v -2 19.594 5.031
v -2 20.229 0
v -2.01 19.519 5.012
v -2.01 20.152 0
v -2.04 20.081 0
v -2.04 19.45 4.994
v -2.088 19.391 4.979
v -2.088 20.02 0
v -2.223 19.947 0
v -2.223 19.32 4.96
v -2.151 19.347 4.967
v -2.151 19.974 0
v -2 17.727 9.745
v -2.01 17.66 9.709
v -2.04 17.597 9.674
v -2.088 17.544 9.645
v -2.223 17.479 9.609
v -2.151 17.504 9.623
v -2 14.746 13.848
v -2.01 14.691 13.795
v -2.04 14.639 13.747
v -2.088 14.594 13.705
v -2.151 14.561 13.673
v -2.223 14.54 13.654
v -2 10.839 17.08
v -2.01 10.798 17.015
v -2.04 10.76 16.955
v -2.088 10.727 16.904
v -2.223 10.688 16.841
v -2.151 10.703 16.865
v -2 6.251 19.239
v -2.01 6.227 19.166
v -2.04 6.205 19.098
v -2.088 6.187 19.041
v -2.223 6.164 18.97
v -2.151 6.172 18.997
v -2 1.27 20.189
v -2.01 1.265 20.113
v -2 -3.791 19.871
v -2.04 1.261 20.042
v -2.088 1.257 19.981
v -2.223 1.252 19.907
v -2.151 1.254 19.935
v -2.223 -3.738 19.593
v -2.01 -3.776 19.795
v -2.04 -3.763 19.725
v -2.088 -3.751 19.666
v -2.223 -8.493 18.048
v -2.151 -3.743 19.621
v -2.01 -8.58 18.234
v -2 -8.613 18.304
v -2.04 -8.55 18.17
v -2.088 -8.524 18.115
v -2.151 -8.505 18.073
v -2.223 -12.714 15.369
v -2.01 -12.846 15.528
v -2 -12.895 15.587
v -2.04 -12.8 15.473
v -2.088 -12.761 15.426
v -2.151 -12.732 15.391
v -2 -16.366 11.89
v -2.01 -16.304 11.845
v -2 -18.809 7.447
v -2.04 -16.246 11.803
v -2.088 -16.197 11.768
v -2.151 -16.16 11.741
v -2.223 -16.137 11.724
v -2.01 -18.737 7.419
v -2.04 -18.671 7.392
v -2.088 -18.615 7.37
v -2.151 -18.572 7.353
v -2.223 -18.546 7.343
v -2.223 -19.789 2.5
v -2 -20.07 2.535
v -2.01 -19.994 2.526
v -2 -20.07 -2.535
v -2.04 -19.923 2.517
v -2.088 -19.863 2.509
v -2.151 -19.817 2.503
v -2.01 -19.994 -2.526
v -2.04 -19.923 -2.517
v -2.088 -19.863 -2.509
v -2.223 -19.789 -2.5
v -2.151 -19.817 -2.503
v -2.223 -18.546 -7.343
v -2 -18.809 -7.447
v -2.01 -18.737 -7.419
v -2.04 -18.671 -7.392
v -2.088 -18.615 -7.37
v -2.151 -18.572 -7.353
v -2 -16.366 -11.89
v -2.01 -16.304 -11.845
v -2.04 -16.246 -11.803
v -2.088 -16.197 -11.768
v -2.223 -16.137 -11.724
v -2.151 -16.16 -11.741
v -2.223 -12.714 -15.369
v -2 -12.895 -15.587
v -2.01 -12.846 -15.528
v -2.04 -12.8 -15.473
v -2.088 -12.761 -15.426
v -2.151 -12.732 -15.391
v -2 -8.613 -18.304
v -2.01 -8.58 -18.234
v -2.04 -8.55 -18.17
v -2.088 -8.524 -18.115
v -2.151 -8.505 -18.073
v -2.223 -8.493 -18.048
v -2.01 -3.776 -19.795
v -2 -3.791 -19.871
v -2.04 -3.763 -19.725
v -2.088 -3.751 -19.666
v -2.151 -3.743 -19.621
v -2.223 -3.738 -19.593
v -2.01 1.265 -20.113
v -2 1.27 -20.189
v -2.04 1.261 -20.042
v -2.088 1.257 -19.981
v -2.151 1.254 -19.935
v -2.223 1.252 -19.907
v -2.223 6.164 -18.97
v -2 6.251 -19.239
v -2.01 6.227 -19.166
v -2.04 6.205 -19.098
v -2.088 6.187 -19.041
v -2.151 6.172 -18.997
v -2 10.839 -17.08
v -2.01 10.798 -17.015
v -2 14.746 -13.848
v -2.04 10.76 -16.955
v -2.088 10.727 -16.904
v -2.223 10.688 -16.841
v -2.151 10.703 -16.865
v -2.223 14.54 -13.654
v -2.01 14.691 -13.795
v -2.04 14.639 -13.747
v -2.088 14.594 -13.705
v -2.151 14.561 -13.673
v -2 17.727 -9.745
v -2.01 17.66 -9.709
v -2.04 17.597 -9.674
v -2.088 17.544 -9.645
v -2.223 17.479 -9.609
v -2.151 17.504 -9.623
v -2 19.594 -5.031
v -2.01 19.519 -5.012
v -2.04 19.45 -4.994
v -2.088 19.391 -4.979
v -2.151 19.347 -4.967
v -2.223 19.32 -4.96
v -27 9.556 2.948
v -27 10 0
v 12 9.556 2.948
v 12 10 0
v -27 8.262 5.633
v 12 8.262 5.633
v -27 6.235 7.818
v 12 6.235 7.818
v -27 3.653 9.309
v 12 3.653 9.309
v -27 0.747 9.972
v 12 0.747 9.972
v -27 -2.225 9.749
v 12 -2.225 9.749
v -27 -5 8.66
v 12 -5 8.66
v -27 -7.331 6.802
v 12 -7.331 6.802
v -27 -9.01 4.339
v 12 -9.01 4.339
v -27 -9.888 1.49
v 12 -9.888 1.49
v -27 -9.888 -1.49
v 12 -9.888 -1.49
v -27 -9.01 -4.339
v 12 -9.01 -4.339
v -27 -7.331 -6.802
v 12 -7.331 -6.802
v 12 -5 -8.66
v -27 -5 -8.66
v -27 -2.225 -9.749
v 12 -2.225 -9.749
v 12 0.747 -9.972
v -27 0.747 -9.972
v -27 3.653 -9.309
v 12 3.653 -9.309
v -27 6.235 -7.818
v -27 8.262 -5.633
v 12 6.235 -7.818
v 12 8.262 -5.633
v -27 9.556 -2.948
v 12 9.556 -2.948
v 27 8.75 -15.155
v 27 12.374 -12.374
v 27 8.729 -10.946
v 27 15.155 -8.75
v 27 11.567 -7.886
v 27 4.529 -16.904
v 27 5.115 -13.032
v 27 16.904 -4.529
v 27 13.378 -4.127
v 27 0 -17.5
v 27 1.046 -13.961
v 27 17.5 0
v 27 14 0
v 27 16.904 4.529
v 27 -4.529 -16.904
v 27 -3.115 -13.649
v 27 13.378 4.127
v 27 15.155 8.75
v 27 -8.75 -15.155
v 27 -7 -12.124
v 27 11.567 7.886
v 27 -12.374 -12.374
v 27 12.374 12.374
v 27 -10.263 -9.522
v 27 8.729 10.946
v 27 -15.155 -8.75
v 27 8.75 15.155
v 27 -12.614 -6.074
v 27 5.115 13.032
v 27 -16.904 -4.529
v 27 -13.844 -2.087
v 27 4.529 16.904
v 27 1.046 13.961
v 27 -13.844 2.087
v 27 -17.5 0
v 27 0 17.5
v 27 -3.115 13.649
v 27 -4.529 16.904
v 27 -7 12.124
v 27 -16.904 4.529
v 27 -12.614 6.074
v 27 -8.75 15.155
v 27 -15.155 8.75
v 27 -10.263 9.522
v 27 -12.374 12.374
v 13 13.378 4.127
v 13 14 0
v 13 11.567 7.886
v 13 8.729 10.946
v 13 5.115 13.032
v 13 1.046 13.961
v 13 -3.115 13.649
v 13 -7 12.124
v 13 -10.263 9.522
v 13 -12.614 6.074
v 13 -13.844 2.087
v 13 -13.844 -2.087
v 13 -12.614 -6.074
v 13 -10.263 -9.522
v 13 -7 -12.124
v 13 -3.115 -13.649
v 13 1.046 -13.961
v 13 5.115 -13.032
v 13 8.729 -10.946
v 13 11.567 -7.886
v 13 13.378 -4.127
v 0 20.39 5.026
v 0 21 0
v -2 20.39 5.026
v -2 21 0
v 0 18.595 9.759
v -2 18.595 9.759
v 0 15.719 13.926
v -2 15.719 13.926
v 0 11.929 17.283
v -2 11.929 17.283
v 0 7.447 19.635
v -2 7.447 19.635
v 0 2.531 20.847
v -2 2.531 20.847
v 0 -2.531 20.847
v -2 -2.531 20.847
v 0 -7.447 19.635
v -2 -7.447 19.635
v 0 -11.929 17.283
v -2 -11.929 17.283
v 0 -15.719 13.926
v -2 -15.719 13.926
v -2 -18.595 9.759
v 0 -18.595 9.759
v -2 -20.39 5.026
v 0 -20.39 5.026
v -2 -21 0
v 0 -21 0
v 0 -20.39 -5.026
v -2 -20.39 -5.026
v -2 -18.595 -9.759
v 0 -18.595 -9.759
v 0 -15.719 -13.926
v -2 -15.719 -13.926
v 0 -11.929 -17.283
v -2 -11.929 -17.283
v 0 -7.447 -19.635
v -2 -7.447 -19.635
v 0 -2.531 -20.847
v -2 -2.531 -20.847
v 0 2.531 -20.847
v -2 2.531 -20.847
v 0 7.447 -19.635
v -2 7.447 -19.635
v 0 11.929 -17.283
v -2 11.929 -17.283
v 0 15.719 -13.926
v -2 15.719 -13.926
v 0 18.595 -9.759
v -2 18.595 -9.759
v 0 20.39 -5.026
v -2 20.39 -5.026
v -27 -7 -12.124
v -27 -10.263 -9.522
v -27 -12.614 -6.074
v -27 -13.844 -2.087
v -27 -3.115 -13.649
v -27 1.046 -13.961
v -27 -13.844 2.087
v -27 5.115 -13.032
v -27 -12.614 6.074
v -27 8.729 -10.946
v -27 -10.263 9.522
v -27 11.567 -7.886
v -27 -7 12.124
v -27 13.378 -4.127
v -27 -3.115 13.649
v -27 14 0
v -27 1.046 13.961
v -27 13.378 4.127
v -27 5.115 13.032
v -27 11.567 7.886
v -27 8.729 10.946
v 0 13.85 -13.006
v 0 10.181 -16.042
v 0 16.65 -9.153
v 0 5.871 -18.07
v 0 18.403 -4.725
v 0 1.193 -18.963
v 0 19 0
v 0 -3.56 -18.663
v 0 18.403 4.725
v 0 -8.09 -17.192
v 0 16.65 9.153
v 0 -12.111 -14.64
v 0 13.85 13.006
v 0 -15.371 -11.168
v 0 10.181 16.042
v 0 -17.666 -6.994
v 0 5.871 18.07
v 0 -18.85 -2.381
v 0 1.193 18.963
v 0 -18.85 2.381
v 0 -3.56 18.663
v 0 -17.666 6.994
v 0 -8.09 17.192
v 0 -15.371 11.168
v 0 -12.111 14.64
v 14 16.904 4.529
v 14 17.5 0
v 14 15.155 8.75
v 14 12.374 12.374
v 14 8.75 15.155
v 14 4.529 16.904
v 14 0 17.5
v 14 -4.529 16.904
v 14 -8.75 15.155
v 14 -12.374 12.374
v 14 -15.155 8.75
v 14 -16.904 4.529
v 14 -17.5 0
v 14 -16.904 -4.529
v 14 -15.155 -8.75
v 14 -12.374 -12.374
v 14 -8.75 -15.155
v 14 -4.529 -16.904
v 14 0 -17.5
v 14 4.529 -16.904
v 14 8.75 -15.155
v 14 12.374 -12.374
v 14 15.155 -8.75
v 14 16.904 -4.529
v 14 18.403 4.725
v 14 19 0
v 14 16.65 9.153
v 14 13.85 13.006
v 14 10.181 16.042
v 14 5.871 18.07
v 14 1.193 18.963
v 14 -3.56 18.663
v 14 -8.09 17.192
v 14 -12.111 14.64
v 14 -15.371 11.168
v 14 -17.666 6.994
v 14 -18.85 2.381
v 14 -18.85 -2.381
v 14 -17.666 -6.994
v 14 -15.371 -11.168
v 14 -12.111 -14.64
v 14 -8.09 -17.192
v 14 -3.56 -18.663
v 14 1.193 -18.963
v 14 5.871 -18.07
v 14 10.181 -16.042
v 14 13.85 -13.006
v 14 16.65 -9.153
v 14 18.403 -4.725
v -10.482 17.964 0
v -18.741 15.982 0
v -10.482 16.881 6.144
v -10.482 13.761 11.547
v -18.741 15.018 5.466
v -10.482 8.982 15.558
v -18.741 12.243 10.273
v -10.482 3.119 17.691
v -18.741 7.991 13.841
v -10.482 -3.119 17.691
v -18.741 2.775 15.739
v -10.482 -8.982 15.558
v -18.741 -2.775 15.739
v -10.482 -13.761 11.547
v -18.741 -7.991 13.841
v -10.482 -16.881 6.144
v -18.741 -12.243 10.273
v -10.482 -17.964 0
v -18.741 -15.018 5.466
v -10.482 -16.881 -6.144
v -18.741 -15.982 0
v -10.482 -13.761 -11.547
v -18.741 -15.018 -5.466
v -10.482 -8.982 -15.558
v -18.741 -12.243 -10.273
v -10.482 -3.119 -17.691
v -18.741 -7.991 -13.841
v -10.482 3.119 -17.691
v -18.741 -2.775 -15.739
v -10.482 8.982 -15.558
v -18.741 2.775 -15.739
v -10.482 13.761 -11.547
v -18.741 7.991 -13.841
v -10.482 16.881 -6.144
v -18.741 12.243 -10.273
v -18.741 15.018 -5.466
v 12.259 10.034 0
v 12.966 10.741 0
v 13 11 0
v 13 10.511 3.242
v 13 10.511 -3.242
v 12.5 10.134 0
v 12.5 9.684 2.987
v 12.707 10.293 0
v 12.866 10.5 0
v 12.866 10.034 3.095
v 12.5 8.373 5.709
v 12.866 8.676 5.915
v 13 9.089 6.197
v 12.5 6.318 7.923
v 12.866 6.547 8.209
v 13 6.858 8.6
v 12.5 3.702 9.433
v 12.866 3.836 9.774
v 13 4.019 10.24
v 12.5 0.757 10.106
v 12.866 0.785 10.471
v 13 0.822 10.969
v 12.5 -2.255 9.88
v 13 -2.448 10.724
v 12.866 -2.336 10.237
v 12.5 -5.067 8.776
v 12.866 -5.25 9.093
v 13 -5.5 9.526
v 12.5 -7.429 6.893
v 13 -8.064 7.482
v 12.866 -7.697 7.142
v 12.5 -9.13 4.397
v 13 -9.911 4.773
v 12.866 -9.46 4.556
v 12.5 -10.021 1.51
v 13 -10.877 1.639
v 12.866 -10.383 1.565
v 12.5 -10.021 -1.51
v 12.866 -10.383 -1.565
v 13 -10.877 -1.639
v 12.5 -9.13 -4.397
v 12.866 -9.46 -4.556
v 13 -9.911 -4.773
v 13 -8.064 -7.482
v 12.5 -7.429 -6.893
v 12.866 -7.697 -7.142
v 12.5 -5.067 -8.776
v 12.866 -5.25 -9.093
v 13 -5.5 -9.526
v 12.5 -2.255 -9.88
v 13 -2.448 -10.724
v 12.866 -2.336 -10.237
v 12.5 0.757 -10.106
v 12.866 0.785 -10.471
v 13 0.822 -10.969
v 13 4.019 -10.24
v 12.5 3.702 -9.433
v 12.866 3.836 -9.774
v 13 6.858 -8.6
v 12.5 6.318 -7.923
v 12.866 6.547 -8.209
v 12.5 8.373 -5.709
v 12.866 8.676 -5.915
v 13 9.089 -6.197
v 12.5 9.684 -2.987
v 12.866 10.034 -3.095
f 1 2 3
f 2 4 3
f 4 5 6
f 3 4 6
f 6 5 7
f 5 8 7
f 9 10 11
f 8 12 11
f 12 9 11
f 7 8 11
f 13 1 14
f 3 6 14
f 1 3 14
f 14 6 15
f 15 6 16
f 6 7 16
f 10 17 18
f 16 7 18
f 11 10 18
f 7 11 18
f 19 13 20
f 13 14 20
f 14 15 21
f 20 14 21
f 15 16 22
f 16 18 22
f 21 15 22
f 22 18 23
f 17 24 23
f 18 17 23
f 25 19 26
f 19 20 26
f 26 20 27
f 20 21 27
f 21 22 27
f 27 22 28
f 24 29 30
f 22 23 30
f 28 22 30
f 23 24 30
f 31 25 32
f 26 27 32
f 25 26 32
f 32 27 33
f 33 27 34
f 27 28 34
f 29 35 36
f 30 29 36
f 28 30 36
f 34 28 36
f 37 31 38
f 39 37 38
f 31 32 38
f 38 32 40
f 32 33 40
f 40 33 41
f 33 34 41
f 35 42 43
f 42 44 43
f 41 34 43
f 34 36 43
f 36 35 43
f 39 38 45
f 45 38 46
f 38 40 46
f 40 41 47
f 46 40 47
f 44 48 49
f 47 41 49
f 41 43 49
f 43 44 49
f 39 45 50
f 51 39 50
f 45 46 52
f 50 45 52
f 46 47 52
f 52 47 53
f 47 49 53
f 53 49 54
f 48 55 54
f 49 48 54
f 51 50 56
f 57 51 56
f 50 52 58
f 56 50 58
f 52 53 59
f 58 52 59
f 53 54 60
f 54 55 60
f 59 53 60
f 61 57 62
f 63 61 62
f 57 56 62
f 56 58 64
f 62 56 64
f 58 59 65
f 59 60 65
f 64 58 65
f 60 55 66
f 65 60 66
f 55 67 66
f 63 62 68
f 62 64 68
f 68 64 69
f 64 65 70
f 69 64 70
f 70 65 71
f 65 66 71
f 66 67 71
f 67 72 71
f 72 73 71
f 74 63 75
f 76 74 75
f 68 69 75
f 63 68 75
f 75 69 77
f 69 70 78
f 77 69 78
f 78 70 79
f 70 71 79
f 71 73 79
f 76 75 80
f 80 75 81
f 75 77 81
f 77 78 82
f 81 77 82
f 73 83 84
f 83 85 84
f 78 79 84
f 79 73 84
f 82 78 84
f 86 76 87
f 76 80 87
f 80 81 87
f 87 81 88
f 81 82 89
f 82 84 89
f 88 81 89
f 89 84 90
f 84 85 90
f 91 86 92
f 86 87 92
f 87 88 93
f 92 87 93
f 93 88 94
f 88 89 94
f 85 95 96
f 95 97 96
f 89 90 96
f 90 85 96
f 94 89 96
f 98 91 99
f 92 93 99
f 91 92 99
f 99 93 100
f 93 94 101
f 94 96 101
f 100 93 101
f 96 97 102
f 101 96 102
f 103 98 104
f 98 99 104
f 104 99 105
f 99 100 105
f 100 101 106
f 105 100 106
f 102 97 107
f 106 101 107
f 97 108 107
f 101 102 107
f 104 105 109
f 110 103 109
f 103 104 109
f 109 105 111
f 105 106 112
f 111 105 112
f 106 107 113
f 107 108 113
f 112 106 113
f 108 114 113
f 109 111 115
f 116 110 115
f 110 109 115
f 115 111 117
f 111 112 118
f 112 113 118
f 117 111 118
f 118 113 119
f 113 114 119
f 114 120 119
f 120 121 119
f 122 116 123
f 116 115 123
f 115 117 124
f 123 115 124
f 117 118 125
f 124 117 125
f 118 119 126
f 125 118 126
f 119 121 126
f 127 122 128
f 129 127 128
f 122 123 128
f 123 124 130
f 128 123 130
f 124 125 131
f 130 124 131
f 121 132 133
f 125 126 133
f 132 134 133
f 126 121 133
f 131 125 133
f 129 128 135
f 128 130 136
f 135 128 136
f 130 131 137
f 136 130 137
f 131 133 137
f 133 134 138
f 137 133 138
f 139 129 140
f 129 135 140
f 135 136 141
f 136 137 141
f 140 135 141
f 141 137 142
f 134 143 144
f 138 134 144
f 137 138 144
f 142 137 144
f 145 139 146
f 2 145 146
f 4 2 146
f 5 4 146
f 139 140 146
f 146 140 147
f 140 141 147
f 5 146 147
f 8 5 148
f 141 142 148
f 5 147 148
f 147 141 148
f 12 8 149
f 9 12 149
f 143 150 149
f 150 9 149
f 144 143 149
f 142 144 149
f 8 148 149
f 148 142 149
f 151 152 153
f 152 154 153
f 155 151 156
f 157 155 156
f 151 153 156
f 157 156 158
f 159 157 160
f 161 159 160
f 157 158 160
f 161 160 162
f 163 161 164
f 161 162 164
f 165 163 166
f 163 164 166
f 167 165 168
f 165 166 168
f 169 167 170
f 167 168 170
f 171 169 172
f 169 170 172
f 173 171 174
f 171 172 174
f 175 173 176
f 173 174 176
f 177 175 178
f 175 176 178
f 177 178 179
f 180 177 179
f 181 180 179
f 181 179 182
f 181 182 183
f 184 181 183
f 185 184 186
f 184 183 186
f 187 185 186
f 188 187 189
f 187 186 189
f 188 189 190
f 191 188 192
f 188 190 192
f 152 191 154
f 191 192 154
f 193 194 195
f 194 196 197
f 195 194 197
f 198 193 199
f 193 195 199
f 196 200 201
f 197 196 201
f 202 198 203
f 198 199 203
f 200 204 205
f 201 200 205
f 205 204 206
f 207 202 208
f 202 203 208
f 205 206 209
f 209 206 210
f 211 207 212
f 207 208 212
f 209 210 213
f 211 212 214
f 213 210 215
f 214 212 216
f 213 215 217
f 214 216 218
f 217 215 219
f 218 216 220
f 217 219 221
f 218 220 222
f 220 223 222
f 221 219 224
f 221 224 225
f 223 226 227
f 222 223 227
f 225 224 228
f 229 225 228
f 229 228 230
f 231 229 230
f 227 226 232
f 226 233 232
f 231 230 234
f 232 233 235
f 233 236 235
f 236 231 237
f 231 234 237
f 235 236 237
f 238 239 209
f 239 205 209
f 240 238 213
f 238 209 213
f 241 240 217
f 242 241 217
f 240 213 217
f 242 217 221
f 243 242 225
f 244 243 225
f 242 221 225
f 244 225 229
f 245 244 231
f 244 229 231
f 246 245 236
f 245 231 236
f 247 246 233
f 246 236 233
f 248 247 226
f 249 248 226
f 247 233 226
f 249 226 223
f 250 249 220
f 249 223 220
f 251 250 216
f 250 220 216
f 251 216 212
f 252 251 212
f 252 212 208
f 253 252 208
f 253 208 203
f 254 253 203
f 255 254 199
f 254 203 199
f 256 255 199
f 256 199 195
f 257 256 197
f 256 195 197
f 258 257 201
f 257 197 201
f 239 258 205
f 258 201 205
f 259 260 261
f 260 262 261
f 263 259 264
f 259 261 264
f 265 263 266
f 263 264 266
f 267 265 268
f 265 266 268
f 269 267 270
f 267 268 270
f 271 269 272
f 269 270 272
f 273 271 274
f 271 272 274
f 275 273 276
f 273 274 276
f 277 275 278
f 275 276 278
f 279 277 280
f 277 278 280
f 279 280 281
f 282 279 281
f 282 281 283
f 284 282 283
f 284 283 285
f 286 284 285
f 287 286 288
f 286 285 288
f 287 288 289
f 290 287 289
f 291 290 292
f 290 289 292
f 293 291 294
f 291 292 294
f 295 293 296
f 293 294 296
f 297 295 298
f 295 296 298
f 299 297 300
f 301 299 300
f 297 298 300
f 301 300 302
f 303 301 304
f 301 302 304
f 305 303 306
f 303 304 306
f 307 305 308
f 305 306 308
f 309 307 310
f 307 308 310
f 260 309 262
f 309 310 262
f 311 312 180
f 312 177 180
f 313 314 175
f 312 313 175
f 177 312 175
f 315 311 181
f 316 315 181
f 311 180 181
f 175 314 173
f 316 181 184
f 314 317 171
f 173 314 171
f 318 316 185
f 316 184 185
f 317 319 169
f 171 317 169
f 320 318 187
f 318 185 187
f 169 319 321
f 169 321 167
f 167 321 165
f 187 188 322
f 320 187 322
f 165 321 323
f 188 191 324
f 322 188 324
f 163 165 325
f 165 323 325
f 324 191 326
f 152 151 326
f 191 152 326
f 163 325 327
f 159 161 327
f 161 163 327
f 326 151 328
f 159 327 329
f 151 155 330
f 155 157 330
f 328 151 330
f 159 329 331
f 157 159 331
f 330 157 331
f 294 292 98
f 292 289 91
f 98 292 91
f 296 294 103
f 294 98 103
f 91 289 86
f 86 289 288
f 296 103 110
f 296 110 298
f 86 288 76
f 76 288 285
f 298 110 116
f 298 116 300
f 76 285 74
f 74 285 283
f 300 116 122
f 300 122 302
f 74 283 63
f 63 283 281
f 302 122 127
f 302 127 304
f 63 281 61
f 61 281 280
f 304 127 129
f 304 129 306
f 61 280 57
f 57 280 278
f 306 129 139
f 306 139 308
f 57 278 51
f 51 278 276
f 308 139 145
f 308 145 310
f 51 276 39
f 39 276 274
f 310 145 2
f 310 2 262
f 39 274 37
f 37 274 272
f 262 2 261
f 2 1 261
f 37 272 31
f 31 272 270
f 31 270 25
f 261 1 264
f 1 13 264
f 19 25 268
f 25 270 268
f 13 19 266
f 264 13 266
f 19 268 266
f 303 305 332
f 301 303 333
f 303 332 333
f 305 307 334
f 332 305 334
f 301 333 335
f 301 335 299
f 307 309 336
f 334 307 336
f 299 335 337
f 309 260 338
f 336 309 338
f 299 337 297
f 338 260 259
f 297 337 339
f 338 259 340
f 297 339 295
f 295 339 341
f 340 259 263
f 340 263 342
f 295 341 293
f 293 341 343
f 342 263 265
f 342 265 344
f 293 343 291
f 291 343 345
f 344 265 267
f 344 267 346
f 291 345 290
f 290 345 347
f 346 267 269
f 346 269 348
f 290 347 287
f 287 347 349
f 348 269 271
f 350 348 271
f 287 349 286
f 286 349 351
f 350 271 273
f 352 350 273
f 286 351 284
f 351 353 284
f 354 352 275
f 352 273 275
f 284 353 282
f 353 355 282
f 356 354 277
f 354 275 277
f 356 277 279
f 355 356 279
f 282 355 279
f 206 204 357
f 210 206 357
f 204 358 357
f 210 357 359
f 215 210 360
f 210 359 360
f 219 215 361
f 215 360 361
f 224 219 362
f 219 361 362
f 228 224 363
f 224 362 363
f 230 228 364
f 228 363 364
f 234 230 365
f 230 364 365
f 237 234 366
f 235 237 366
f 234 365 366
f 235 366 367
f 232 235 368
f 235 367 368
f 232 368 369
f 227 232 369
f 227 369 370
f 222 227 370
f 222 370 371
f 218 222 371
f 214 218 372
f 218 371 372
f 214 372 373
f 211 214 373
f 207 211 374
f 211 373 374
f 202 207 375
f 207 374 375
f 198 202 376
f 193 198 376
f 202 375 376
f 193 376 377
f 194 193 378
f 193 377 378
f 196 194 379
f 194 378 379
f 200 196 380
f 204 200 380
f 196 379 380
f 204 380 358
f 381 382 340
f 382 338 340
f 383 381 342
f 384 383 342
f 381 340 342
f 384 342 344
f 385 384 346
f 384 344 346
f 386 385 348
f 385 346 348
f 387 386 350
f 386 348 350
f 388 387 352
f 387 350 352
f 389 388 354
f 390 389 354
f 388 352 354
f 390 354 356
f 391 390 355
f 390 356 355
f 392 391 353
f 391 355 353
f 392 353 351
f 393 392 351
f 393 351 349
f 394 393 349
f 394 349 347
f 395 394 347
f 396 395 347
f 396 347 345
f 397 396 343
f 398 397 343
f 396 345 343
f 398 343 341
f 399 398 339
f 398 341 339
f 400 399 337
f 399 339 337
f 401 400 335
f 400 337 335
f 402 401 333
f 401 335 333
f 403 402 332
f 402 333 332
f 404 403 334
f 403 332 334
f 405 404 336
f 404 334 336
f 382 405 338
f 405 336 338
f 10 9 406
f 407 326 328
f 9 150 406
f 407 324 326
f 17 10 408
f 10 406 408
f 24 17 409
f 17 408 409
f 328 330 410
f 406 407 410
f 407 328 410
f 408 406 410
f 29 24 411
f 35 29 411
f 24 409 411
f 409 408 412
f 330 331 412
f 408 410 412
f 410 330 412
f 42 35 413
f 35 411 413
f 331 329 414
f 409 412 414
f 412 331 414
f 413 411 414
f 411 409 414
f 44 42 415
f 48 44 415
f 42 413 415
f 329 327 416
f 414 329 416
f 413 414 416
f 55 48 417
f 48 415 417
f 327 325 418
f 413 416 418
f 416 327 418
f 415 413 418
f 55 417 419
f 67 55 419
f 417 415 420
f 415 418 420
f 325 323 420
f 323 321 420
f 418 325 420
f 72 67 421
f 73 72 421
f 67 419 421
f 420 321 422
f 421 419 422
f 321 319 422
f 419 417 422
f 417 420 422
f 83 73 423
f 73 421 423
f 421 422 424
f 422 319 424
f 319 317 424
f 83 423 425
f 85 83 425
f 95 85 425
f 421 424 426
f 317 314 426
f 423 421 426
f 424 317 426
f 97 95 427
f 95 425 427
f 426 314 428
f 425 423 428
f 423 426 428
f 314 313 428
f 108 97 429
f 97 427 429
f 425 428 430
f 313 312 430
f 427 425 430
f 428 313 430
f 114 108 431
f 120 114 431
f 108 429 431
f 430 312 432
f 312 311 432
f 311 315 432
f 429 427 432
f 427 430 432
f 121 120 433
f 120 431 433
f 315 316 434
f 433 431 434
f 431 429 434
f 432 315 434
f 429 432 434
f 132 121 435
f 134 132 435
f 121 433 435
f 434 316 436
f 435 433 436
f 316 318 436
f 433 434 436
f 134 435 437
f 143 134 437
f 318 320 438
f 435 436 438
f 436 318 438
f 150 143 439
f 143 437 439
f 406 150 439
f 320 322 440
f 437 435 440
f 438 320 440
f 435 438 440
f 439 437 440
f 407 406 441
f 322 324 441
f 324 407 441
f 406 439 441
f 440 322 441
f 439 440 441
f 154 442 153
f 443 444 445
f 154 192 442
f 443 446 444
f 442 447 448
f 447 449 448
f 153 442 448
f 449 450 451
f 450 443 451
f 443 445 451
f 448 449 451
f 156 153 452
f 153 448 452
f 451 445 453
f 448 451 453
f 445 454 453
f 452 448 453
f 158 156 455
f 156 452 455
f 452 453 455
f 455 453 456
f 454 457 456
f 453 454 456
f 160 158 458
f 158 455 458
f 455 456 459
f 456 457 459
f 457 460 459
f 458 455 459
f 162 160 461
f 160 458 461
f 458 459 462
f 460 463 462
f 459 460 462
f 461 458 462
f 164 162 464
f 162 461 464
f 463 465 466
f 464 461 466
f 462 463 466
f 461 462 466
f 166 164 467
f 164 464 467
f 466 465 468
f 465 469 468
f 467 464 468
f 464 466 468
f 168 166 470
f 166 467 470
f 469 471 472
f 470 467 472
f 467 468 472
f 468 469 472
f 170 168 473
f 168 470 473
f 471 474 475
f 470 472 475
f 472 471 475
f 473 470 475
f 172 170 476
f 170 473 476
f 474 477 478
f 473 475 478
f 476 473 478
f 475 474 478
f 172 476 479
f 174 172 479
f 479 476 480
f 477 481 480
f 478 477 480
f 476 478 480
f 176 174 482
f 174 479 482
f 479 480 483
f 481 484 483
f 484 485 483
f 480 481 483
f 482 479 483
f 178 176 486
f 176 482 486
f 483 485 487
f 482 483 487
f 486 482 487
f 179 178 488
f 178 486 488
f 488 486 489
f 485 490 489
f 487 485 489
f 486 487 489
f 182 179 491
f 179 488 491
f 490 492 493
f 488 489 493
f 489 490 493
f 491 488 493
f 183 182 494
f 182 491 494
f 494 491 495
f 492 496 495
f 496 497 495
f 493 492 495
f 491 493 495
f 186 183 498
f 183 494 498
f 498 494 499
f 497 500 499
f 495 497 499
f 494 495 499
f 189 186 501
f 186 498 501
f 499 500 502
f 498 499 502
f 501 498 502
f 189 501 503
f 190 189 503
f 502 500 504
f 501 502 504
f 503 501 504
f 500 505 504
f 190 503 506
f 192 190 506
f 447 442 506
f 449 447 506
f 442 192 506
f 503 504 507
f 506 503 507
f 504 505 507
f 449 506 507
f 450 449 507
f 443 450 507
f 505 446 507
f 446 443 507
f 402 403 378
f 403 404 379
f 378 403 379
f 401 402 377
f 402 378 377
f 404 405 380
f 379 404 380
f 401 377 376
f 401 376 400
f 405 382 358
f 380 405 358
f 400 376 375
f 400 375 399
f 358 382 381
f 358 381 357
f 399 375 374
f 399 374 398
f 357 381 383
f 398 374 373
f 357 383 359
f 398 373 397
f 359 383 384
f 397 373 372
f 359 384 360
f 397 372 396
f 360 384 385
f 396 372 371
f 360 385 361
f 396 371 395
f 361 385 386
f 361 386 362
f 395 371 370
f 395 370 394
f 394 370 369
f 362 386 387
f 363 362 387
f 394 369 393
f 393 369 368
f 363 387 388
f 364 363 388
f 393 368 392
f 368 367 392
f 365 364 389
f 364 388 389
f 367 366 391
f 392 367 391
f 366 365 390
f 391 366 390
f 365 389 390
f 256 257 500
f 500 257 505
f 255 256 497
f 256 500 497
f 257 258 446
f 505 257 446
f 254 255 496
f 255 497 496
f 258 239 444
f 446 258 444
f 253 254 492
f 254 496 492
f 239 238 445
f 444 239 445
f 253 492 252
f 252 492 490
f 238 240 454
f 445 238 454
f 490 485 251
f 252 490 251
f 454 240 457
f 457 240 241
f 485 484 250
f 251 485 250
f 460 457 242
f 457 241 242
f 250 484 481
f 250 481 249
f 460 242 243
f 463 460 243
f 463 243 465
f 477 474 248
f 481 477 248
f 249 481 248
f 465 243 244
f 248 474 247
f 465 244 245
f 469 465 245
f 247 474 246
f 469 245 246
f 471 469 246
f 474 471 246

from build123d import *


with BuildPart() as part:
    # Sketch1 → Revolve1 (revolve)
    with BuildSketch(Plane.XY):
        with BuildLine():
            Line((-27, 10), (12, 10))
            ThreePointArc((12, 10), (12.707106781, 10.292893219), (13, 11))
            Line((13, 11), (13, 14))
            Line((13, 14), (27, 14))
            Line((27, 14), (27, 17.5))
            Line((27, 17.5), (14, 17.5))
            Line((14, 17.5), (14, 19))
            Line((14, 19), (0, 19))
            Line((0, 19), (0, 21))
            Line((0, 21), (-2, 21))
            Line((-2, 21), (-2, 20.229142798))
            ThreePointArc((-2, 20.229142798), (-2.062403045, 20.049198361), (-2.222815548, 19.946524269))
            Line((-2.222815548, 19.946524269), (-27, 14))
            Line((-27, 14), (-27, 10))
        make_face()
    revolve(axis=Axis((-27, 0, 0), (1, 0, 0)))


solid = part.part
